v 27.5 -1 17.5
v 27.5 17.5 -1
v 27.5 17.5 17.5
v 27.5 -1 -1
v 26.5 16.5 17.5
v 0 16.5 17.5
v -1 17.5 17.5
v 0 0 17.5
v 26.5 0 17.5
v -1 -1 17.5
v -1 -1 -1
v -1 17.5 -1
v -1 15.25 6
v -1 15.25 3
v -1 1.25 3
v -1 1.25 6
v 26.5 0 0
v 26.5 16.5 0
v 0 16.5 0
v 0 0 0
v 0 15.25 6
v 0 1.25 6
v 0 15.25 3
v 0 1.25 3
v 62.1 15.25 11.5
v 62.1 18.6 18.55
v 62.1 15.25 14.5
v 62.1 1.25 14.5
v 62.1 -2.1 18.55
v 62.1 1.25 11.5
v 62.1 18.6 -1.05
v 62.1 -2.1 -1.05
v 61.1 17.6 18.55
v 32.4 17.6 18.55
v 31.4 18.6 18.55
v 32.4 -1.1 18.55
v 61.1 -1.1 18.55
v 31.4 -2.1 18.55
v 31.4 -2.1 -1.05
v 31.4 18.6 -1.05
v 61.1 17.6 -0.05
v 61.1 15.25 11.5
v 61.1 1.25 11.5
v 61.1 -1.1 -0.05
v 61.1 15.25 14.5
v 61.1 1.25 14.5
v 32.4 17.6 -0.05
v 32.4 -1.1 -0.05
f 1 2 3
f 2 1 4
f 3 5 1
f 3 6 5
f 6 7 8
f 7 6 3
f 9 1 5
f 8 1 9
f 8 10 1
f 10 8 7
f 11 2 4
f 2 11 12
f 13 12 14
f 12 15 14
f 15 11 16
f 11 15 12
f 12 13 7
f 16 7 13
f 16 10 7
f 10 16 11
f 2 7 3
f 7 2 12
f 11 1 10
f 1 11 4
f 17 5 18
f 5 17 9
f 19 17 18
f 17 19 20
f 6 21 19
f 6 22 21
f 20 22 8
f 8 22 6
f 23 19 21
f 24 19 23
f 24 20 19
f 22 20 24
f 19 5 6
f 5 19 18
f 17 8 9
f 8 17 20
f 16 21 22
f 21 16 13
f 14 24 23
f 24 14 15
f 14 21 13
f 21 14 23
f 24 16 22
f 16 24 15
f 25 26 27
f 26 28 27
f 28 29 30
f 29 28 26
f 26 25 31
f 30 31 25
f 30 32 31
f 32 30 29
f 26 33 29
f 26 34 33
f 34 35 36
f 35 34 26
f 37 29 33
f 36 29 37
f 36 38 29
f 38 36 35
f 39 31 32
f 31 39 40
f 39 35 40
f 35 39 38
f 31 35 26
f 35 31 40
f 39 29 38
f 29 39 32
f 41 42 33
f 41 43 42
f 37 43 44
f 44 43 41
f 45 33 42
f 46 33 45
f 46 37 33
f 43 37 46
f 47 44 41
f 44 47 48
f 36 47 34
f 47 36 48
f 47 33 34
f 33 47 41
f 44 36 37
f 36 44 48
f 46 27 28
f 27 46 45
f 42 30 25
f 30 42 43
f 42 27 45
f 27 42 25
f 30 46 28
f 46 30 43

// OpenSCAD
boundary=[26.5,16.5,17.5];
space=[.2,.2,.1];
conn = [1.25,3,14,3];

wall = 1;

difference() {
	translate([-wall,-wall,-wall]) cube(boundary+[2*wall,2*wall,wall]);
	cube(boundary+[0,0,1]);
	translate([-wall-1,conn[0],conn[1]]) cube([1+wall+1,conn[2],conn[3]]);
}

translate([boundary[0]+2*wall+5,0,0]) difference() {
	translate([-2*wall,-2*wall,-wall]-space/2) cube(boundary + [4*wall,4*wall,2*wall] + space);
	translate([-wall,-wall,0]-space/2) cube(boundary + [2*wall,2*wall,wall+1] + space);
	translate([boundary[0]+2*wall-1,conn[0],boundary[2]-conn[1]-conn[3]]) cube([1+wall+1,conn[2],conn[3]]);
}
